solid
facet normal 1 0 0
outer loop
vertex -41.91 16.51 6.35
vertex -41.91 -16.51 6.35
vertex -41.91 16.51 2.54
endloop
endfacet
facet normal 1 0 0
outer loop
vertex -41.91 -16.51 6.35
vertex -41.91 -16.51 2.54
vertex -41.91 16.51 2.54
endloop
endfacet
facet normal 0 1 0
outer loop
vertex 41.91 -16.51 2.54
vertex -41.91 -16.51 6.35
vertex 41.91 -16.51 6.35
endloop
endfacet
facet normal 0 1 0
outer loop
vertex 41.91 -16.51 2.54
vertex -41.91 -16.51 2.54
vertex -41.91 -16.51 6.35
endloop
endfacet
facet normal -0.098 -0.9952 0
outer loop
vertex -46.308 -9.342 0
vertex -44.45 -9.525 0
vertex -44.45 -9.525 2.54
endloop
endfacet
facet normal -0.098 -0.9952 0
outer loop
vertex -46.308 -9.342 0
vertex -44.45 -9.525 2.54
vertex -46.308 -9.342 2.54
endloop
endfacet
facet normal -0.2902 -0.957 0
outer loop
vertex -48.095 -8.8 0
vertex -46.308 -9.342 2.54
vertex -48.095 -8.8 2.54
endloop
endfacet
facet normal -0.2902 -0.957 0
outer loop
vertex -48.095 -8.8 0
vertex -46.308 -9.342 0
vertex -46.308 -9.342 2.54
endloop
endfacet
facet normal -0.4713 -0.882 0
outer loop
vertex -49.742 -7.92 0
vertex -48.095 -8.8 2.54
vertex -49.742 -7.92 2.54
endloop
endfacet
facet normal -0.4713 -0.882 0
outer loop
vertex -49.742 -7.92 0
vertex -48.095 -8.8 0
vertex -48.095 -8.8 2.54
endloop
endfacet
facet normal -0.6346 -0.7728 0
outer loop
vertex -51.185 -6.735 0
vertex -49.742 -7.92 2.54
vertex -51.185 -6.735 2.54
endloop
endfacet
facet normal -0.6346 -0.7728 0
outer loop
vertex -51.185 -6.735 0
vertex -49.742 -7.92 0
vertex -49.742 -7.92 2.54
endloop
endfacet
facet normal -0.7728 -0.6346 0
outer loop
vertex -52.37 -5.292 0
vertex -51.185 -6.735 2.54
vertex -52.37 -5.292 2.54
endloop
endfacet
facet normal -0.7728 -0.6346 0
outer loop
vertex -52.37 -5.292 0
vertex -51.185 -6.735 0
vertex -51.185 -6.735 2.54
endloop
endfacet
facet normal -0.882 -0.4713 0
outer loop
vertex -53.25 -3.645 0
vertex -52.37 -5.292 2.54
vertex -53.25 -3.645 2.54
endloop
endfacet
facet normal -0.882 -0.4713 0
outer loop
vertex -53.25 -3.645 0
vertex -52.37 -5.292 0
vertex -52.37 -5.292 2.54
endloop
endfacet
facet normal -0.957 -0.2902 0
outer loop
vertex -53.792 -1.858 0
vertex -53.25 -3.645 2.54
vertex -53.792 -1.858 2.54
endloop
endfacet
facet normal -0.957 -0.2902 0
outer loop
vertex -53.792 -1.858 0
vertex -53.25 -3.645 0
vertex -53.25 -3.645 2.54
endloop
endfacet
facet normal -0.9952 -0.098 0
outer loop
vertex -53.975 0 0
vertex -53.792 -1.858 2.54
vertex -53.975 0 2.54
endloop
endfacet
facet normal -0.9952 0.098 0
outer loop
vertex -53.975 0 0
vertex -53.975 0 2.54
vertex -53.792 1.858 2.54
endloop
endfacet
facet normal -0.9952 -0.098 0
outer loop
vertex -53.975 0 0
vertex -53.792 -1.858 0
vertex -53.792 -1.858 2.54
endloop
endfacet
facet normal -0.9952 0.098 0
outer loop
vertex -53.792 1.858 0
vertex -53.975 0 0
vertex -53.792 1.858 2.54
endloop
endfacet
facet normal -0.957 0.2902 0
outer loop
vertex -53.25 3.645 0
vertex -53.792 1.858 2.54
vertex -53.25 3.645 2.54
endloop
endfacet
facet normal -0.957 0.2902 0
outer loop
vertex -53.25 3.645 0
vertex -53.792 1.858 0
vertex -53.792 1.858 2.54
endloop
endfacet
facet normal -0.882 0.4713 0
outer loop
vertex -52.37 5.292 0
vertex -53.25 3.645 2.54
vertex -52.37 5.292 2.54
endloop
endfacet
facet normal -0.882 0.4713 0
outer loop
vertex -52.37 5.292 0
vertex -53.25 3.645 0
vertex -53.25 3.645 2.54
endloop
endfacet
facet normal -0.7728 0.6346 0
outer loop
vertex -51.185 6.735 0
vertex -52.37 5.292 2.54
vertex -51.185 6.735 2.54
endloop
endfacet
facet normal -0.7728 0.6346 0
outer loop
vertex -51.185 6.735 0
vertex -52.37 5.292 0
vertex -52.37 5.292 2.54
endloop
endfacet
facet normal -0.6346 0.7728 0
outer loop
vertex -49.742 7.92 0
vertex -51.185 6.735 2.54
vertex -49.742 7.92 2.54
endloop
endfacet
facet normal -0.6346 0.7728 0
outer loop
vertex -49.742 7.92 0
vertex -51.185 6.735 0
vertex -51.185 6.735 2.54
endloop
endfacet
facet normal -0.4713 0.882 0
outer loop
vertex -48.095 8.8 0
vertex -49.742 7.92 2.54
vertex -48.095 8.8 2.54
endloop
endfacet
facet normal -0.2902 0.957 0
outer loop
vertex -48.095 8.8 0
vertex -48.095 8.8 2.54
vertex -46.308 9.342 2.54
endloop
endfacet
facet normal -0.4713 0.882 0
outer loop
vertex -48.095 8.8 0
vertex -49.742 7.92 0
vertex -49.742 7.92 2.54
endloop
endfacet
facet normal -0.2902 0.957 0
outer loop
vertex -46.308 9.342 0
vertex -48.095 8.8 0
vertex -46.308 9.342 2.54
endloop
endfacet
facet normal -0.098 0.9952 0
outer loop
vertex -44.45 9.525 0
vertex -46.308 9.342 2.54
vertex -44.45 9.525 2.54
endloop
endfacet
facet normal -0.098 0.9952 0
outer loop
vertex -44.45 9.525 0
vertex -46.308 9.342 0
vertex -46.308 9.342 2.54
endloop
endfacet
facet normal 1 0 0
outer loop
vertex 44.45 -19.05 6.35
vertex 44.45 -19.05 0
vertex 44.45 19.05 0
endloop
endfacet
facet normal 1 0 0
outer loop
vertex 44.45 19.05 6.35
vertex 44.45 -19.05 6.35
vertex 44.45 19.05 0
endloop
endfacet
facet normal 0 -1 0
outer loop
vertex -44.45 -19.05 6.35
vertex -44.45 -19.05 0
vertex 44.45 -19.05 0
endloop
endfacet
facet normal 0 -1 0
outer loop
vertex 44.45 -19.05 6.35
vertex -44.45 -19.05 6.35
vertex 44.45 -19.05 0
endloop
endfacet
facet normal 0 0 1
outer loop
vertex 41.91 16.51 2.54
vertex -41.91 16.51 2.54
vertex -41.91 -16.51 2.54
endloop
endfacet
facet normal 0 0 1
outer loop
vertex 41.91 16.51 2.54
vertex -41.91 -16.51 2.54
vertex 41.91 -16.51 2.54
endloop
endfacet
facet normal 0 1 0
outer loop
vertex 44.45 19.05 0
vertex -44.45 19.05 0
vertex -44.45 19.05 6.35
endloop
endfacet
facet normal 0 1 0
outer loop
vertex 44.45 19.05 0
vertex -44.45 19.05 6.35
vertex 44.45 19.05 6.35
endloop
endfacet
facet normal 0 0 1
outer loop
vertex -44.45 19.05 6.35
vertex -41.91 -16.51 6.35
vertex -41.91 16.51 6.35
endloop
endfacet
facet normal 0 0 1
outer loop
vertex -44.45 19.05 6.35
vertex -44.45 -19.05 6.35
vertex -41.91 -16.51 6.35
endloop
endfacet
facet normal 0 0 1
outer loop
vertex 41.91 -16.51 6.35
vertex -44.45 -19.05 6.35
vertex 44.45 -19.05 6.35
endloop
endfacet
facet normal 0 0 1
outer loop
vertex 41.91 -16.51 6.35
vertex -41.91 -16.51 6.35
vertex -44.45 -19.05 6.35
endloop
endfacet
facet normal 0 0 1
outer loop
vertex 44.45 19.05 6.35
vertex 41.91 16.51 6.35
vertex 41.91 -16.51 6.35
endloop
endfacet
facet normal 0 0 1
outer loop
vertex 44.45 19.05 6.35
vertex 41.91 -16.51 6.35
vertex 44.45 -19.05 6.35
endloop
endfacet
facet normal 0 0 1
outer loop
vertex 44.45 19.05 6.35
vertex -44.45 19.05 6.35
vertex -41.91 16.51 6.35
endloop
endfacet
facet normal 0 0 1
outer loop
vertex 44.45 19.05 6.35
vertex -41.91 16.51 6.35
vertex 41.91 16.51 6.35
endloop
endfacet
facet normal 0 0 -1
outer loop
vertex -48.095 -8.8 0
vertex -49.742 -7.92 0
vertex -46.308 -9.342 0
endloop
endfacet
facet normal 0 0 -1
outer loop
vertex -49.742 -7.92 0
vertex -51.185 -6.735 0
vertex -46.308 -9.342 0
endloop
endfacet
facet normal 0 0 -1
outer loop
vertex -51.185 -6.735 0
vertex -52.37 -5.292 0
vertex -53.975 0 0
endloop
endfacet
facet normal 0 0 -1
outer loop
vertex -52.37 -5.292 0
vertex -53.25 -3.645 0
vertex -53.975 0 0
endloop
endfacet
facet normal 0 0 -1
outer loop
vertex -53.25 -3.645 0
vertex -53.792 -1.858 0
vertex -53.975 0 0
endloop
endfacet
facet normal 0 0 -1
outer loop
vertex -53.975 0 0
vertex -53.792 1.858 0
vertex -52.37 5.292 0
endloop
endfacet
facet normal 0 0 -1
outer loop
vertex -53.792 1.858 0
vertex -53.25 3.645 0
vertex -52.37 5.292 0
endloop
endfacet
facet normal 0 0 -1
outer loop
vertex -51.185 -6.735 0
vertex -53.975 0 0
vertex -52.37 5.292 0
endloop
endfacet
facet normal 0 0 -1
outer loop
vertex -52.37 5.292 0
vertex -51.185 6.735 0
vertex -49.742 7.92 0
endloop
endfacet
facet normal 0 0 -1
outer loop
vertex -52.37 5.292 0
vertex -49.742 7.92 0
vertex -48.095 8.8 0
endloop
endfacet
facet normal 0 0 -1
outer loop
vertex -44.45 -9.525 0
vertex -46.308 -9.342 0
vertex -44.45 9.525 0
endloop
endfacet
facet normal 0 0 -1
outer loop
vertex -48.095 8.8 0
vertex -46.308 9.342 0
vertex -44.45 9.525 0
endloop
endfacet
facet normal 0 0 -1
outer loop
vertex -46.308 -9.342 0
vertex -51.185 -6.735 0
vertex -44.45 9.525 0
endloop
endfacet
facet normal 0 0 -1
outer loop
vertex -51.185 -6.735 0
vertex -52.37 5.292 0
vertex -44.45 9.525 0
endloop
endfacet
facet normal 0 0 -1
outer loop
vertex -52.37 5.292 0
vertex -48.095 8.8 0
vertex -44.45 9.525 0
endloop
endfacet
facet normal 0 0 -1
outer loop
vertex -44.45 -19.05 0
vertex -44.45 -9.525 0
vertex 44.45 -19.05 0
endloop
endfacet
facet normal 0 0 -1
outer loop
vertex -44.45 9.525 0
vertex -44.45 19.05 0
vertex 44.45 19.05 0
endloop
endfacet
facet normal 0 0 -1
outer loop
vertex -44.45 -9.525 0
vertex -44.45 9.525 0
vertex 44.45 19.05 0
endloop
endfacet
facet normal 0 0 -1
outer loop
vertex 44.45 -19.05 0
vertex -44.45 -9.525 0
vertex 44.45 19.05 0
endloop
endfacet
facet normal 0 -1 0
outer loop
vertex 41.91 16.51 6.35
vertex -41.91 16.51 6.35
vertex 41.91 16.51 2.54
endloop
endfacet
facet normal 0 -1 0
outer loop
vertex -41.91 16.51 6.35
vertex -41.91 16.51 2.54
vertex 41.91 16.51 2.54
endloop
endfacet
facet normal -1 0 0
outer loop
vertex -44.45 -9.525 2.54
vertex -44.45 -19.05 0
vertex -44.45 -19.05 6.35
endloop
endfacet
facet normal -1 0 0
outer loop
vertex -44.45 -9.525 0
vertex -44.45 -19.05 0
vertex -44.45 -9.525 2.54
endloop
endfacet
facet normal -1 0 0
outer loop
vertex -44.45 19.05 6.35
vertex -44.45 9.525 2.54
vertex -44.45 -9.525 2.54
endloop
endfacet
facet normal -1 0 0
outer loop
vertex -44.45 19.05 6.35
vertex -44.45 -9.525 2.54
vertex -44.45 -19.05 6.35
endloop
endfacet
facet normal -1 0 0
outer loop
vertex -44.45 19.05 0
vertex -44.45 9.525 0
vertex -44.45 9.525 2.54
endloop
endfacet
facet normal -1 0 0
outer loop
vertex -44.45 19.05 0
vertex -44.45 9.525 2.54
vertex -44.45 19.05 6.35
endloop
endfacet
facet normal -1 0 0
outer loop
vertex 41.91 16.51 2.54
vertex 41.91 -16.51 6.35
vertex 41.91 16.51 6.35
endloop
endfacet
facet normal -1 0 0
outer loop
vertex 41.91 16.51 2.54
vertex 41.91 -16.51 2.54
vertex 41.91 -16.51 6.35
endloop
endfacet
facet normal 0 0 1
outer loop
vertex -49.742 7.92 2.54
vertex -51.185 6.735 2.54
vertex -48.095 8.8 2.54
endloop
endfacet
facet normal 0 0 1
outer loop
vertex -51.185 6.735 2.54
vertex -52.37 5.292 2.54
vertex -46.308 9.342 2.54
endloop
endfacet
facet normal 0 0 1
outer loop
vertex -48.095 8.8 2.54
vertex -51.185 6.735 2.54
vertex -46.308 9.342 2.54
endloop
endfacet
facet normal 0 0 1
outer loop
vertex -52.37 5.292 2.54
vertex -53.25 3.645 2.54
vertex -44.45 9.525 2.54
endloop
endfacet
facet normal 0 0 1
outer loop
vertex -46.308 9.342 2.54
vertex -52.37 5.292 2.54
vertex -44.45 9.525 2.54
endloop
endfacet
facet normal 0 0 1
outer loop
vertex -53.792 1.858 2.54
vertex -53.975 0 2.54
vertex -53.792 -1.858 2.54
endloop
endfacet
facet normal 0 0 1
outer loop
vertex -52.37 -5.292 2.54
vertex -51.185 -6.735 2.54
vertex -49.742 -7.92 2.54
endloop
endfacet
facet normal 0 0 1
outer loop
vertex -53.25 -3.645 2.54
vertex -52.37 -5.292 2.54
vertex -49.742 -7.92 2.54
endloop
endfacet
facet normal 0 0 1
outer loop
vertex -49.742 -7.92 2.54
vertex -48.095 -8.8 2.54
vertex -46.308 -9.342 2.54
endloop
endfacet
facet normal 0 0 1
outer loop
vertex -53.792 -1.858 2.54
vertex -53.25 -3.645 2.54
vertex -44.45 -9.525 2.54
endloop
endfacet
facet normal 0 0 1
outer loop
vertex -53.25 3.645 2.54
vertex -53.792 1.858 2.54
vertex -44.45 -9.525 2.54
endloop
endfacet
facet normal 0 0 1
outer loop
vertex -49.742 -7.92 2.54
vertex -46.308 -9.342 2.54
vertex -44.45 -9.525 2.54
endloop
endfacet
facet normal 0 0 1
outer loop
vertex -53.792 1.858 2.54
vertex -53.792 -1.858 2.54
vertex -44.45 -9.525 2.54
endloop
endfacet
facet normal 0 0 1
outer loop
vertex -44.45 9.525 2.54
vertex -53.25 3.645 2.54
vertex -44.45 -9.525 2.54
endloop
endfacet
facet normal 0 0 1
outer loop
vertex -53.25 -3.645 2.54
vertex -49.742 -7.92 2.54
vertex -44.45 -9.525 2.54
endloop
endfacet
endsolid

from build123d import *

# Parameters (mm, degrees)
F0_W     = 88.9
F0_H     = 38.1
F1_DEPTH = 6.35
F2_T     = -2.54
F4_DEPTH = 2.54


with BuildPart() as f1:
    # F0 (on Top) → F1 (new body)
    with BuildSketch(Plane.XY):
        Rectangle(F0_W, F0_H)
    extrude(amount=F1_DEPTH)

    # F2
    f2_openings = [f1.faces().sort_by_distance(p)[0] for p in [
        (0, 0, 6.35),
    ]]
    offset(amount=F2_T, openings=f2_openings)

    # F3 (on face) → F4 (join)
    with BuildSketch(Plane(origin=(0, 0, 0), x_dir=(1, 0, 0), z_dir=(0, 0, -1))):
        with BuildLine():
            Line((-44.45, -9.525), (-44.45, 9.525))
            ThreePointArc((-44.45, 9.525), (-53.975, 0), (-44.45, -9.525))
        make_face()
    extrude(amount=-F4_DEPTH)


solid = f1.part
